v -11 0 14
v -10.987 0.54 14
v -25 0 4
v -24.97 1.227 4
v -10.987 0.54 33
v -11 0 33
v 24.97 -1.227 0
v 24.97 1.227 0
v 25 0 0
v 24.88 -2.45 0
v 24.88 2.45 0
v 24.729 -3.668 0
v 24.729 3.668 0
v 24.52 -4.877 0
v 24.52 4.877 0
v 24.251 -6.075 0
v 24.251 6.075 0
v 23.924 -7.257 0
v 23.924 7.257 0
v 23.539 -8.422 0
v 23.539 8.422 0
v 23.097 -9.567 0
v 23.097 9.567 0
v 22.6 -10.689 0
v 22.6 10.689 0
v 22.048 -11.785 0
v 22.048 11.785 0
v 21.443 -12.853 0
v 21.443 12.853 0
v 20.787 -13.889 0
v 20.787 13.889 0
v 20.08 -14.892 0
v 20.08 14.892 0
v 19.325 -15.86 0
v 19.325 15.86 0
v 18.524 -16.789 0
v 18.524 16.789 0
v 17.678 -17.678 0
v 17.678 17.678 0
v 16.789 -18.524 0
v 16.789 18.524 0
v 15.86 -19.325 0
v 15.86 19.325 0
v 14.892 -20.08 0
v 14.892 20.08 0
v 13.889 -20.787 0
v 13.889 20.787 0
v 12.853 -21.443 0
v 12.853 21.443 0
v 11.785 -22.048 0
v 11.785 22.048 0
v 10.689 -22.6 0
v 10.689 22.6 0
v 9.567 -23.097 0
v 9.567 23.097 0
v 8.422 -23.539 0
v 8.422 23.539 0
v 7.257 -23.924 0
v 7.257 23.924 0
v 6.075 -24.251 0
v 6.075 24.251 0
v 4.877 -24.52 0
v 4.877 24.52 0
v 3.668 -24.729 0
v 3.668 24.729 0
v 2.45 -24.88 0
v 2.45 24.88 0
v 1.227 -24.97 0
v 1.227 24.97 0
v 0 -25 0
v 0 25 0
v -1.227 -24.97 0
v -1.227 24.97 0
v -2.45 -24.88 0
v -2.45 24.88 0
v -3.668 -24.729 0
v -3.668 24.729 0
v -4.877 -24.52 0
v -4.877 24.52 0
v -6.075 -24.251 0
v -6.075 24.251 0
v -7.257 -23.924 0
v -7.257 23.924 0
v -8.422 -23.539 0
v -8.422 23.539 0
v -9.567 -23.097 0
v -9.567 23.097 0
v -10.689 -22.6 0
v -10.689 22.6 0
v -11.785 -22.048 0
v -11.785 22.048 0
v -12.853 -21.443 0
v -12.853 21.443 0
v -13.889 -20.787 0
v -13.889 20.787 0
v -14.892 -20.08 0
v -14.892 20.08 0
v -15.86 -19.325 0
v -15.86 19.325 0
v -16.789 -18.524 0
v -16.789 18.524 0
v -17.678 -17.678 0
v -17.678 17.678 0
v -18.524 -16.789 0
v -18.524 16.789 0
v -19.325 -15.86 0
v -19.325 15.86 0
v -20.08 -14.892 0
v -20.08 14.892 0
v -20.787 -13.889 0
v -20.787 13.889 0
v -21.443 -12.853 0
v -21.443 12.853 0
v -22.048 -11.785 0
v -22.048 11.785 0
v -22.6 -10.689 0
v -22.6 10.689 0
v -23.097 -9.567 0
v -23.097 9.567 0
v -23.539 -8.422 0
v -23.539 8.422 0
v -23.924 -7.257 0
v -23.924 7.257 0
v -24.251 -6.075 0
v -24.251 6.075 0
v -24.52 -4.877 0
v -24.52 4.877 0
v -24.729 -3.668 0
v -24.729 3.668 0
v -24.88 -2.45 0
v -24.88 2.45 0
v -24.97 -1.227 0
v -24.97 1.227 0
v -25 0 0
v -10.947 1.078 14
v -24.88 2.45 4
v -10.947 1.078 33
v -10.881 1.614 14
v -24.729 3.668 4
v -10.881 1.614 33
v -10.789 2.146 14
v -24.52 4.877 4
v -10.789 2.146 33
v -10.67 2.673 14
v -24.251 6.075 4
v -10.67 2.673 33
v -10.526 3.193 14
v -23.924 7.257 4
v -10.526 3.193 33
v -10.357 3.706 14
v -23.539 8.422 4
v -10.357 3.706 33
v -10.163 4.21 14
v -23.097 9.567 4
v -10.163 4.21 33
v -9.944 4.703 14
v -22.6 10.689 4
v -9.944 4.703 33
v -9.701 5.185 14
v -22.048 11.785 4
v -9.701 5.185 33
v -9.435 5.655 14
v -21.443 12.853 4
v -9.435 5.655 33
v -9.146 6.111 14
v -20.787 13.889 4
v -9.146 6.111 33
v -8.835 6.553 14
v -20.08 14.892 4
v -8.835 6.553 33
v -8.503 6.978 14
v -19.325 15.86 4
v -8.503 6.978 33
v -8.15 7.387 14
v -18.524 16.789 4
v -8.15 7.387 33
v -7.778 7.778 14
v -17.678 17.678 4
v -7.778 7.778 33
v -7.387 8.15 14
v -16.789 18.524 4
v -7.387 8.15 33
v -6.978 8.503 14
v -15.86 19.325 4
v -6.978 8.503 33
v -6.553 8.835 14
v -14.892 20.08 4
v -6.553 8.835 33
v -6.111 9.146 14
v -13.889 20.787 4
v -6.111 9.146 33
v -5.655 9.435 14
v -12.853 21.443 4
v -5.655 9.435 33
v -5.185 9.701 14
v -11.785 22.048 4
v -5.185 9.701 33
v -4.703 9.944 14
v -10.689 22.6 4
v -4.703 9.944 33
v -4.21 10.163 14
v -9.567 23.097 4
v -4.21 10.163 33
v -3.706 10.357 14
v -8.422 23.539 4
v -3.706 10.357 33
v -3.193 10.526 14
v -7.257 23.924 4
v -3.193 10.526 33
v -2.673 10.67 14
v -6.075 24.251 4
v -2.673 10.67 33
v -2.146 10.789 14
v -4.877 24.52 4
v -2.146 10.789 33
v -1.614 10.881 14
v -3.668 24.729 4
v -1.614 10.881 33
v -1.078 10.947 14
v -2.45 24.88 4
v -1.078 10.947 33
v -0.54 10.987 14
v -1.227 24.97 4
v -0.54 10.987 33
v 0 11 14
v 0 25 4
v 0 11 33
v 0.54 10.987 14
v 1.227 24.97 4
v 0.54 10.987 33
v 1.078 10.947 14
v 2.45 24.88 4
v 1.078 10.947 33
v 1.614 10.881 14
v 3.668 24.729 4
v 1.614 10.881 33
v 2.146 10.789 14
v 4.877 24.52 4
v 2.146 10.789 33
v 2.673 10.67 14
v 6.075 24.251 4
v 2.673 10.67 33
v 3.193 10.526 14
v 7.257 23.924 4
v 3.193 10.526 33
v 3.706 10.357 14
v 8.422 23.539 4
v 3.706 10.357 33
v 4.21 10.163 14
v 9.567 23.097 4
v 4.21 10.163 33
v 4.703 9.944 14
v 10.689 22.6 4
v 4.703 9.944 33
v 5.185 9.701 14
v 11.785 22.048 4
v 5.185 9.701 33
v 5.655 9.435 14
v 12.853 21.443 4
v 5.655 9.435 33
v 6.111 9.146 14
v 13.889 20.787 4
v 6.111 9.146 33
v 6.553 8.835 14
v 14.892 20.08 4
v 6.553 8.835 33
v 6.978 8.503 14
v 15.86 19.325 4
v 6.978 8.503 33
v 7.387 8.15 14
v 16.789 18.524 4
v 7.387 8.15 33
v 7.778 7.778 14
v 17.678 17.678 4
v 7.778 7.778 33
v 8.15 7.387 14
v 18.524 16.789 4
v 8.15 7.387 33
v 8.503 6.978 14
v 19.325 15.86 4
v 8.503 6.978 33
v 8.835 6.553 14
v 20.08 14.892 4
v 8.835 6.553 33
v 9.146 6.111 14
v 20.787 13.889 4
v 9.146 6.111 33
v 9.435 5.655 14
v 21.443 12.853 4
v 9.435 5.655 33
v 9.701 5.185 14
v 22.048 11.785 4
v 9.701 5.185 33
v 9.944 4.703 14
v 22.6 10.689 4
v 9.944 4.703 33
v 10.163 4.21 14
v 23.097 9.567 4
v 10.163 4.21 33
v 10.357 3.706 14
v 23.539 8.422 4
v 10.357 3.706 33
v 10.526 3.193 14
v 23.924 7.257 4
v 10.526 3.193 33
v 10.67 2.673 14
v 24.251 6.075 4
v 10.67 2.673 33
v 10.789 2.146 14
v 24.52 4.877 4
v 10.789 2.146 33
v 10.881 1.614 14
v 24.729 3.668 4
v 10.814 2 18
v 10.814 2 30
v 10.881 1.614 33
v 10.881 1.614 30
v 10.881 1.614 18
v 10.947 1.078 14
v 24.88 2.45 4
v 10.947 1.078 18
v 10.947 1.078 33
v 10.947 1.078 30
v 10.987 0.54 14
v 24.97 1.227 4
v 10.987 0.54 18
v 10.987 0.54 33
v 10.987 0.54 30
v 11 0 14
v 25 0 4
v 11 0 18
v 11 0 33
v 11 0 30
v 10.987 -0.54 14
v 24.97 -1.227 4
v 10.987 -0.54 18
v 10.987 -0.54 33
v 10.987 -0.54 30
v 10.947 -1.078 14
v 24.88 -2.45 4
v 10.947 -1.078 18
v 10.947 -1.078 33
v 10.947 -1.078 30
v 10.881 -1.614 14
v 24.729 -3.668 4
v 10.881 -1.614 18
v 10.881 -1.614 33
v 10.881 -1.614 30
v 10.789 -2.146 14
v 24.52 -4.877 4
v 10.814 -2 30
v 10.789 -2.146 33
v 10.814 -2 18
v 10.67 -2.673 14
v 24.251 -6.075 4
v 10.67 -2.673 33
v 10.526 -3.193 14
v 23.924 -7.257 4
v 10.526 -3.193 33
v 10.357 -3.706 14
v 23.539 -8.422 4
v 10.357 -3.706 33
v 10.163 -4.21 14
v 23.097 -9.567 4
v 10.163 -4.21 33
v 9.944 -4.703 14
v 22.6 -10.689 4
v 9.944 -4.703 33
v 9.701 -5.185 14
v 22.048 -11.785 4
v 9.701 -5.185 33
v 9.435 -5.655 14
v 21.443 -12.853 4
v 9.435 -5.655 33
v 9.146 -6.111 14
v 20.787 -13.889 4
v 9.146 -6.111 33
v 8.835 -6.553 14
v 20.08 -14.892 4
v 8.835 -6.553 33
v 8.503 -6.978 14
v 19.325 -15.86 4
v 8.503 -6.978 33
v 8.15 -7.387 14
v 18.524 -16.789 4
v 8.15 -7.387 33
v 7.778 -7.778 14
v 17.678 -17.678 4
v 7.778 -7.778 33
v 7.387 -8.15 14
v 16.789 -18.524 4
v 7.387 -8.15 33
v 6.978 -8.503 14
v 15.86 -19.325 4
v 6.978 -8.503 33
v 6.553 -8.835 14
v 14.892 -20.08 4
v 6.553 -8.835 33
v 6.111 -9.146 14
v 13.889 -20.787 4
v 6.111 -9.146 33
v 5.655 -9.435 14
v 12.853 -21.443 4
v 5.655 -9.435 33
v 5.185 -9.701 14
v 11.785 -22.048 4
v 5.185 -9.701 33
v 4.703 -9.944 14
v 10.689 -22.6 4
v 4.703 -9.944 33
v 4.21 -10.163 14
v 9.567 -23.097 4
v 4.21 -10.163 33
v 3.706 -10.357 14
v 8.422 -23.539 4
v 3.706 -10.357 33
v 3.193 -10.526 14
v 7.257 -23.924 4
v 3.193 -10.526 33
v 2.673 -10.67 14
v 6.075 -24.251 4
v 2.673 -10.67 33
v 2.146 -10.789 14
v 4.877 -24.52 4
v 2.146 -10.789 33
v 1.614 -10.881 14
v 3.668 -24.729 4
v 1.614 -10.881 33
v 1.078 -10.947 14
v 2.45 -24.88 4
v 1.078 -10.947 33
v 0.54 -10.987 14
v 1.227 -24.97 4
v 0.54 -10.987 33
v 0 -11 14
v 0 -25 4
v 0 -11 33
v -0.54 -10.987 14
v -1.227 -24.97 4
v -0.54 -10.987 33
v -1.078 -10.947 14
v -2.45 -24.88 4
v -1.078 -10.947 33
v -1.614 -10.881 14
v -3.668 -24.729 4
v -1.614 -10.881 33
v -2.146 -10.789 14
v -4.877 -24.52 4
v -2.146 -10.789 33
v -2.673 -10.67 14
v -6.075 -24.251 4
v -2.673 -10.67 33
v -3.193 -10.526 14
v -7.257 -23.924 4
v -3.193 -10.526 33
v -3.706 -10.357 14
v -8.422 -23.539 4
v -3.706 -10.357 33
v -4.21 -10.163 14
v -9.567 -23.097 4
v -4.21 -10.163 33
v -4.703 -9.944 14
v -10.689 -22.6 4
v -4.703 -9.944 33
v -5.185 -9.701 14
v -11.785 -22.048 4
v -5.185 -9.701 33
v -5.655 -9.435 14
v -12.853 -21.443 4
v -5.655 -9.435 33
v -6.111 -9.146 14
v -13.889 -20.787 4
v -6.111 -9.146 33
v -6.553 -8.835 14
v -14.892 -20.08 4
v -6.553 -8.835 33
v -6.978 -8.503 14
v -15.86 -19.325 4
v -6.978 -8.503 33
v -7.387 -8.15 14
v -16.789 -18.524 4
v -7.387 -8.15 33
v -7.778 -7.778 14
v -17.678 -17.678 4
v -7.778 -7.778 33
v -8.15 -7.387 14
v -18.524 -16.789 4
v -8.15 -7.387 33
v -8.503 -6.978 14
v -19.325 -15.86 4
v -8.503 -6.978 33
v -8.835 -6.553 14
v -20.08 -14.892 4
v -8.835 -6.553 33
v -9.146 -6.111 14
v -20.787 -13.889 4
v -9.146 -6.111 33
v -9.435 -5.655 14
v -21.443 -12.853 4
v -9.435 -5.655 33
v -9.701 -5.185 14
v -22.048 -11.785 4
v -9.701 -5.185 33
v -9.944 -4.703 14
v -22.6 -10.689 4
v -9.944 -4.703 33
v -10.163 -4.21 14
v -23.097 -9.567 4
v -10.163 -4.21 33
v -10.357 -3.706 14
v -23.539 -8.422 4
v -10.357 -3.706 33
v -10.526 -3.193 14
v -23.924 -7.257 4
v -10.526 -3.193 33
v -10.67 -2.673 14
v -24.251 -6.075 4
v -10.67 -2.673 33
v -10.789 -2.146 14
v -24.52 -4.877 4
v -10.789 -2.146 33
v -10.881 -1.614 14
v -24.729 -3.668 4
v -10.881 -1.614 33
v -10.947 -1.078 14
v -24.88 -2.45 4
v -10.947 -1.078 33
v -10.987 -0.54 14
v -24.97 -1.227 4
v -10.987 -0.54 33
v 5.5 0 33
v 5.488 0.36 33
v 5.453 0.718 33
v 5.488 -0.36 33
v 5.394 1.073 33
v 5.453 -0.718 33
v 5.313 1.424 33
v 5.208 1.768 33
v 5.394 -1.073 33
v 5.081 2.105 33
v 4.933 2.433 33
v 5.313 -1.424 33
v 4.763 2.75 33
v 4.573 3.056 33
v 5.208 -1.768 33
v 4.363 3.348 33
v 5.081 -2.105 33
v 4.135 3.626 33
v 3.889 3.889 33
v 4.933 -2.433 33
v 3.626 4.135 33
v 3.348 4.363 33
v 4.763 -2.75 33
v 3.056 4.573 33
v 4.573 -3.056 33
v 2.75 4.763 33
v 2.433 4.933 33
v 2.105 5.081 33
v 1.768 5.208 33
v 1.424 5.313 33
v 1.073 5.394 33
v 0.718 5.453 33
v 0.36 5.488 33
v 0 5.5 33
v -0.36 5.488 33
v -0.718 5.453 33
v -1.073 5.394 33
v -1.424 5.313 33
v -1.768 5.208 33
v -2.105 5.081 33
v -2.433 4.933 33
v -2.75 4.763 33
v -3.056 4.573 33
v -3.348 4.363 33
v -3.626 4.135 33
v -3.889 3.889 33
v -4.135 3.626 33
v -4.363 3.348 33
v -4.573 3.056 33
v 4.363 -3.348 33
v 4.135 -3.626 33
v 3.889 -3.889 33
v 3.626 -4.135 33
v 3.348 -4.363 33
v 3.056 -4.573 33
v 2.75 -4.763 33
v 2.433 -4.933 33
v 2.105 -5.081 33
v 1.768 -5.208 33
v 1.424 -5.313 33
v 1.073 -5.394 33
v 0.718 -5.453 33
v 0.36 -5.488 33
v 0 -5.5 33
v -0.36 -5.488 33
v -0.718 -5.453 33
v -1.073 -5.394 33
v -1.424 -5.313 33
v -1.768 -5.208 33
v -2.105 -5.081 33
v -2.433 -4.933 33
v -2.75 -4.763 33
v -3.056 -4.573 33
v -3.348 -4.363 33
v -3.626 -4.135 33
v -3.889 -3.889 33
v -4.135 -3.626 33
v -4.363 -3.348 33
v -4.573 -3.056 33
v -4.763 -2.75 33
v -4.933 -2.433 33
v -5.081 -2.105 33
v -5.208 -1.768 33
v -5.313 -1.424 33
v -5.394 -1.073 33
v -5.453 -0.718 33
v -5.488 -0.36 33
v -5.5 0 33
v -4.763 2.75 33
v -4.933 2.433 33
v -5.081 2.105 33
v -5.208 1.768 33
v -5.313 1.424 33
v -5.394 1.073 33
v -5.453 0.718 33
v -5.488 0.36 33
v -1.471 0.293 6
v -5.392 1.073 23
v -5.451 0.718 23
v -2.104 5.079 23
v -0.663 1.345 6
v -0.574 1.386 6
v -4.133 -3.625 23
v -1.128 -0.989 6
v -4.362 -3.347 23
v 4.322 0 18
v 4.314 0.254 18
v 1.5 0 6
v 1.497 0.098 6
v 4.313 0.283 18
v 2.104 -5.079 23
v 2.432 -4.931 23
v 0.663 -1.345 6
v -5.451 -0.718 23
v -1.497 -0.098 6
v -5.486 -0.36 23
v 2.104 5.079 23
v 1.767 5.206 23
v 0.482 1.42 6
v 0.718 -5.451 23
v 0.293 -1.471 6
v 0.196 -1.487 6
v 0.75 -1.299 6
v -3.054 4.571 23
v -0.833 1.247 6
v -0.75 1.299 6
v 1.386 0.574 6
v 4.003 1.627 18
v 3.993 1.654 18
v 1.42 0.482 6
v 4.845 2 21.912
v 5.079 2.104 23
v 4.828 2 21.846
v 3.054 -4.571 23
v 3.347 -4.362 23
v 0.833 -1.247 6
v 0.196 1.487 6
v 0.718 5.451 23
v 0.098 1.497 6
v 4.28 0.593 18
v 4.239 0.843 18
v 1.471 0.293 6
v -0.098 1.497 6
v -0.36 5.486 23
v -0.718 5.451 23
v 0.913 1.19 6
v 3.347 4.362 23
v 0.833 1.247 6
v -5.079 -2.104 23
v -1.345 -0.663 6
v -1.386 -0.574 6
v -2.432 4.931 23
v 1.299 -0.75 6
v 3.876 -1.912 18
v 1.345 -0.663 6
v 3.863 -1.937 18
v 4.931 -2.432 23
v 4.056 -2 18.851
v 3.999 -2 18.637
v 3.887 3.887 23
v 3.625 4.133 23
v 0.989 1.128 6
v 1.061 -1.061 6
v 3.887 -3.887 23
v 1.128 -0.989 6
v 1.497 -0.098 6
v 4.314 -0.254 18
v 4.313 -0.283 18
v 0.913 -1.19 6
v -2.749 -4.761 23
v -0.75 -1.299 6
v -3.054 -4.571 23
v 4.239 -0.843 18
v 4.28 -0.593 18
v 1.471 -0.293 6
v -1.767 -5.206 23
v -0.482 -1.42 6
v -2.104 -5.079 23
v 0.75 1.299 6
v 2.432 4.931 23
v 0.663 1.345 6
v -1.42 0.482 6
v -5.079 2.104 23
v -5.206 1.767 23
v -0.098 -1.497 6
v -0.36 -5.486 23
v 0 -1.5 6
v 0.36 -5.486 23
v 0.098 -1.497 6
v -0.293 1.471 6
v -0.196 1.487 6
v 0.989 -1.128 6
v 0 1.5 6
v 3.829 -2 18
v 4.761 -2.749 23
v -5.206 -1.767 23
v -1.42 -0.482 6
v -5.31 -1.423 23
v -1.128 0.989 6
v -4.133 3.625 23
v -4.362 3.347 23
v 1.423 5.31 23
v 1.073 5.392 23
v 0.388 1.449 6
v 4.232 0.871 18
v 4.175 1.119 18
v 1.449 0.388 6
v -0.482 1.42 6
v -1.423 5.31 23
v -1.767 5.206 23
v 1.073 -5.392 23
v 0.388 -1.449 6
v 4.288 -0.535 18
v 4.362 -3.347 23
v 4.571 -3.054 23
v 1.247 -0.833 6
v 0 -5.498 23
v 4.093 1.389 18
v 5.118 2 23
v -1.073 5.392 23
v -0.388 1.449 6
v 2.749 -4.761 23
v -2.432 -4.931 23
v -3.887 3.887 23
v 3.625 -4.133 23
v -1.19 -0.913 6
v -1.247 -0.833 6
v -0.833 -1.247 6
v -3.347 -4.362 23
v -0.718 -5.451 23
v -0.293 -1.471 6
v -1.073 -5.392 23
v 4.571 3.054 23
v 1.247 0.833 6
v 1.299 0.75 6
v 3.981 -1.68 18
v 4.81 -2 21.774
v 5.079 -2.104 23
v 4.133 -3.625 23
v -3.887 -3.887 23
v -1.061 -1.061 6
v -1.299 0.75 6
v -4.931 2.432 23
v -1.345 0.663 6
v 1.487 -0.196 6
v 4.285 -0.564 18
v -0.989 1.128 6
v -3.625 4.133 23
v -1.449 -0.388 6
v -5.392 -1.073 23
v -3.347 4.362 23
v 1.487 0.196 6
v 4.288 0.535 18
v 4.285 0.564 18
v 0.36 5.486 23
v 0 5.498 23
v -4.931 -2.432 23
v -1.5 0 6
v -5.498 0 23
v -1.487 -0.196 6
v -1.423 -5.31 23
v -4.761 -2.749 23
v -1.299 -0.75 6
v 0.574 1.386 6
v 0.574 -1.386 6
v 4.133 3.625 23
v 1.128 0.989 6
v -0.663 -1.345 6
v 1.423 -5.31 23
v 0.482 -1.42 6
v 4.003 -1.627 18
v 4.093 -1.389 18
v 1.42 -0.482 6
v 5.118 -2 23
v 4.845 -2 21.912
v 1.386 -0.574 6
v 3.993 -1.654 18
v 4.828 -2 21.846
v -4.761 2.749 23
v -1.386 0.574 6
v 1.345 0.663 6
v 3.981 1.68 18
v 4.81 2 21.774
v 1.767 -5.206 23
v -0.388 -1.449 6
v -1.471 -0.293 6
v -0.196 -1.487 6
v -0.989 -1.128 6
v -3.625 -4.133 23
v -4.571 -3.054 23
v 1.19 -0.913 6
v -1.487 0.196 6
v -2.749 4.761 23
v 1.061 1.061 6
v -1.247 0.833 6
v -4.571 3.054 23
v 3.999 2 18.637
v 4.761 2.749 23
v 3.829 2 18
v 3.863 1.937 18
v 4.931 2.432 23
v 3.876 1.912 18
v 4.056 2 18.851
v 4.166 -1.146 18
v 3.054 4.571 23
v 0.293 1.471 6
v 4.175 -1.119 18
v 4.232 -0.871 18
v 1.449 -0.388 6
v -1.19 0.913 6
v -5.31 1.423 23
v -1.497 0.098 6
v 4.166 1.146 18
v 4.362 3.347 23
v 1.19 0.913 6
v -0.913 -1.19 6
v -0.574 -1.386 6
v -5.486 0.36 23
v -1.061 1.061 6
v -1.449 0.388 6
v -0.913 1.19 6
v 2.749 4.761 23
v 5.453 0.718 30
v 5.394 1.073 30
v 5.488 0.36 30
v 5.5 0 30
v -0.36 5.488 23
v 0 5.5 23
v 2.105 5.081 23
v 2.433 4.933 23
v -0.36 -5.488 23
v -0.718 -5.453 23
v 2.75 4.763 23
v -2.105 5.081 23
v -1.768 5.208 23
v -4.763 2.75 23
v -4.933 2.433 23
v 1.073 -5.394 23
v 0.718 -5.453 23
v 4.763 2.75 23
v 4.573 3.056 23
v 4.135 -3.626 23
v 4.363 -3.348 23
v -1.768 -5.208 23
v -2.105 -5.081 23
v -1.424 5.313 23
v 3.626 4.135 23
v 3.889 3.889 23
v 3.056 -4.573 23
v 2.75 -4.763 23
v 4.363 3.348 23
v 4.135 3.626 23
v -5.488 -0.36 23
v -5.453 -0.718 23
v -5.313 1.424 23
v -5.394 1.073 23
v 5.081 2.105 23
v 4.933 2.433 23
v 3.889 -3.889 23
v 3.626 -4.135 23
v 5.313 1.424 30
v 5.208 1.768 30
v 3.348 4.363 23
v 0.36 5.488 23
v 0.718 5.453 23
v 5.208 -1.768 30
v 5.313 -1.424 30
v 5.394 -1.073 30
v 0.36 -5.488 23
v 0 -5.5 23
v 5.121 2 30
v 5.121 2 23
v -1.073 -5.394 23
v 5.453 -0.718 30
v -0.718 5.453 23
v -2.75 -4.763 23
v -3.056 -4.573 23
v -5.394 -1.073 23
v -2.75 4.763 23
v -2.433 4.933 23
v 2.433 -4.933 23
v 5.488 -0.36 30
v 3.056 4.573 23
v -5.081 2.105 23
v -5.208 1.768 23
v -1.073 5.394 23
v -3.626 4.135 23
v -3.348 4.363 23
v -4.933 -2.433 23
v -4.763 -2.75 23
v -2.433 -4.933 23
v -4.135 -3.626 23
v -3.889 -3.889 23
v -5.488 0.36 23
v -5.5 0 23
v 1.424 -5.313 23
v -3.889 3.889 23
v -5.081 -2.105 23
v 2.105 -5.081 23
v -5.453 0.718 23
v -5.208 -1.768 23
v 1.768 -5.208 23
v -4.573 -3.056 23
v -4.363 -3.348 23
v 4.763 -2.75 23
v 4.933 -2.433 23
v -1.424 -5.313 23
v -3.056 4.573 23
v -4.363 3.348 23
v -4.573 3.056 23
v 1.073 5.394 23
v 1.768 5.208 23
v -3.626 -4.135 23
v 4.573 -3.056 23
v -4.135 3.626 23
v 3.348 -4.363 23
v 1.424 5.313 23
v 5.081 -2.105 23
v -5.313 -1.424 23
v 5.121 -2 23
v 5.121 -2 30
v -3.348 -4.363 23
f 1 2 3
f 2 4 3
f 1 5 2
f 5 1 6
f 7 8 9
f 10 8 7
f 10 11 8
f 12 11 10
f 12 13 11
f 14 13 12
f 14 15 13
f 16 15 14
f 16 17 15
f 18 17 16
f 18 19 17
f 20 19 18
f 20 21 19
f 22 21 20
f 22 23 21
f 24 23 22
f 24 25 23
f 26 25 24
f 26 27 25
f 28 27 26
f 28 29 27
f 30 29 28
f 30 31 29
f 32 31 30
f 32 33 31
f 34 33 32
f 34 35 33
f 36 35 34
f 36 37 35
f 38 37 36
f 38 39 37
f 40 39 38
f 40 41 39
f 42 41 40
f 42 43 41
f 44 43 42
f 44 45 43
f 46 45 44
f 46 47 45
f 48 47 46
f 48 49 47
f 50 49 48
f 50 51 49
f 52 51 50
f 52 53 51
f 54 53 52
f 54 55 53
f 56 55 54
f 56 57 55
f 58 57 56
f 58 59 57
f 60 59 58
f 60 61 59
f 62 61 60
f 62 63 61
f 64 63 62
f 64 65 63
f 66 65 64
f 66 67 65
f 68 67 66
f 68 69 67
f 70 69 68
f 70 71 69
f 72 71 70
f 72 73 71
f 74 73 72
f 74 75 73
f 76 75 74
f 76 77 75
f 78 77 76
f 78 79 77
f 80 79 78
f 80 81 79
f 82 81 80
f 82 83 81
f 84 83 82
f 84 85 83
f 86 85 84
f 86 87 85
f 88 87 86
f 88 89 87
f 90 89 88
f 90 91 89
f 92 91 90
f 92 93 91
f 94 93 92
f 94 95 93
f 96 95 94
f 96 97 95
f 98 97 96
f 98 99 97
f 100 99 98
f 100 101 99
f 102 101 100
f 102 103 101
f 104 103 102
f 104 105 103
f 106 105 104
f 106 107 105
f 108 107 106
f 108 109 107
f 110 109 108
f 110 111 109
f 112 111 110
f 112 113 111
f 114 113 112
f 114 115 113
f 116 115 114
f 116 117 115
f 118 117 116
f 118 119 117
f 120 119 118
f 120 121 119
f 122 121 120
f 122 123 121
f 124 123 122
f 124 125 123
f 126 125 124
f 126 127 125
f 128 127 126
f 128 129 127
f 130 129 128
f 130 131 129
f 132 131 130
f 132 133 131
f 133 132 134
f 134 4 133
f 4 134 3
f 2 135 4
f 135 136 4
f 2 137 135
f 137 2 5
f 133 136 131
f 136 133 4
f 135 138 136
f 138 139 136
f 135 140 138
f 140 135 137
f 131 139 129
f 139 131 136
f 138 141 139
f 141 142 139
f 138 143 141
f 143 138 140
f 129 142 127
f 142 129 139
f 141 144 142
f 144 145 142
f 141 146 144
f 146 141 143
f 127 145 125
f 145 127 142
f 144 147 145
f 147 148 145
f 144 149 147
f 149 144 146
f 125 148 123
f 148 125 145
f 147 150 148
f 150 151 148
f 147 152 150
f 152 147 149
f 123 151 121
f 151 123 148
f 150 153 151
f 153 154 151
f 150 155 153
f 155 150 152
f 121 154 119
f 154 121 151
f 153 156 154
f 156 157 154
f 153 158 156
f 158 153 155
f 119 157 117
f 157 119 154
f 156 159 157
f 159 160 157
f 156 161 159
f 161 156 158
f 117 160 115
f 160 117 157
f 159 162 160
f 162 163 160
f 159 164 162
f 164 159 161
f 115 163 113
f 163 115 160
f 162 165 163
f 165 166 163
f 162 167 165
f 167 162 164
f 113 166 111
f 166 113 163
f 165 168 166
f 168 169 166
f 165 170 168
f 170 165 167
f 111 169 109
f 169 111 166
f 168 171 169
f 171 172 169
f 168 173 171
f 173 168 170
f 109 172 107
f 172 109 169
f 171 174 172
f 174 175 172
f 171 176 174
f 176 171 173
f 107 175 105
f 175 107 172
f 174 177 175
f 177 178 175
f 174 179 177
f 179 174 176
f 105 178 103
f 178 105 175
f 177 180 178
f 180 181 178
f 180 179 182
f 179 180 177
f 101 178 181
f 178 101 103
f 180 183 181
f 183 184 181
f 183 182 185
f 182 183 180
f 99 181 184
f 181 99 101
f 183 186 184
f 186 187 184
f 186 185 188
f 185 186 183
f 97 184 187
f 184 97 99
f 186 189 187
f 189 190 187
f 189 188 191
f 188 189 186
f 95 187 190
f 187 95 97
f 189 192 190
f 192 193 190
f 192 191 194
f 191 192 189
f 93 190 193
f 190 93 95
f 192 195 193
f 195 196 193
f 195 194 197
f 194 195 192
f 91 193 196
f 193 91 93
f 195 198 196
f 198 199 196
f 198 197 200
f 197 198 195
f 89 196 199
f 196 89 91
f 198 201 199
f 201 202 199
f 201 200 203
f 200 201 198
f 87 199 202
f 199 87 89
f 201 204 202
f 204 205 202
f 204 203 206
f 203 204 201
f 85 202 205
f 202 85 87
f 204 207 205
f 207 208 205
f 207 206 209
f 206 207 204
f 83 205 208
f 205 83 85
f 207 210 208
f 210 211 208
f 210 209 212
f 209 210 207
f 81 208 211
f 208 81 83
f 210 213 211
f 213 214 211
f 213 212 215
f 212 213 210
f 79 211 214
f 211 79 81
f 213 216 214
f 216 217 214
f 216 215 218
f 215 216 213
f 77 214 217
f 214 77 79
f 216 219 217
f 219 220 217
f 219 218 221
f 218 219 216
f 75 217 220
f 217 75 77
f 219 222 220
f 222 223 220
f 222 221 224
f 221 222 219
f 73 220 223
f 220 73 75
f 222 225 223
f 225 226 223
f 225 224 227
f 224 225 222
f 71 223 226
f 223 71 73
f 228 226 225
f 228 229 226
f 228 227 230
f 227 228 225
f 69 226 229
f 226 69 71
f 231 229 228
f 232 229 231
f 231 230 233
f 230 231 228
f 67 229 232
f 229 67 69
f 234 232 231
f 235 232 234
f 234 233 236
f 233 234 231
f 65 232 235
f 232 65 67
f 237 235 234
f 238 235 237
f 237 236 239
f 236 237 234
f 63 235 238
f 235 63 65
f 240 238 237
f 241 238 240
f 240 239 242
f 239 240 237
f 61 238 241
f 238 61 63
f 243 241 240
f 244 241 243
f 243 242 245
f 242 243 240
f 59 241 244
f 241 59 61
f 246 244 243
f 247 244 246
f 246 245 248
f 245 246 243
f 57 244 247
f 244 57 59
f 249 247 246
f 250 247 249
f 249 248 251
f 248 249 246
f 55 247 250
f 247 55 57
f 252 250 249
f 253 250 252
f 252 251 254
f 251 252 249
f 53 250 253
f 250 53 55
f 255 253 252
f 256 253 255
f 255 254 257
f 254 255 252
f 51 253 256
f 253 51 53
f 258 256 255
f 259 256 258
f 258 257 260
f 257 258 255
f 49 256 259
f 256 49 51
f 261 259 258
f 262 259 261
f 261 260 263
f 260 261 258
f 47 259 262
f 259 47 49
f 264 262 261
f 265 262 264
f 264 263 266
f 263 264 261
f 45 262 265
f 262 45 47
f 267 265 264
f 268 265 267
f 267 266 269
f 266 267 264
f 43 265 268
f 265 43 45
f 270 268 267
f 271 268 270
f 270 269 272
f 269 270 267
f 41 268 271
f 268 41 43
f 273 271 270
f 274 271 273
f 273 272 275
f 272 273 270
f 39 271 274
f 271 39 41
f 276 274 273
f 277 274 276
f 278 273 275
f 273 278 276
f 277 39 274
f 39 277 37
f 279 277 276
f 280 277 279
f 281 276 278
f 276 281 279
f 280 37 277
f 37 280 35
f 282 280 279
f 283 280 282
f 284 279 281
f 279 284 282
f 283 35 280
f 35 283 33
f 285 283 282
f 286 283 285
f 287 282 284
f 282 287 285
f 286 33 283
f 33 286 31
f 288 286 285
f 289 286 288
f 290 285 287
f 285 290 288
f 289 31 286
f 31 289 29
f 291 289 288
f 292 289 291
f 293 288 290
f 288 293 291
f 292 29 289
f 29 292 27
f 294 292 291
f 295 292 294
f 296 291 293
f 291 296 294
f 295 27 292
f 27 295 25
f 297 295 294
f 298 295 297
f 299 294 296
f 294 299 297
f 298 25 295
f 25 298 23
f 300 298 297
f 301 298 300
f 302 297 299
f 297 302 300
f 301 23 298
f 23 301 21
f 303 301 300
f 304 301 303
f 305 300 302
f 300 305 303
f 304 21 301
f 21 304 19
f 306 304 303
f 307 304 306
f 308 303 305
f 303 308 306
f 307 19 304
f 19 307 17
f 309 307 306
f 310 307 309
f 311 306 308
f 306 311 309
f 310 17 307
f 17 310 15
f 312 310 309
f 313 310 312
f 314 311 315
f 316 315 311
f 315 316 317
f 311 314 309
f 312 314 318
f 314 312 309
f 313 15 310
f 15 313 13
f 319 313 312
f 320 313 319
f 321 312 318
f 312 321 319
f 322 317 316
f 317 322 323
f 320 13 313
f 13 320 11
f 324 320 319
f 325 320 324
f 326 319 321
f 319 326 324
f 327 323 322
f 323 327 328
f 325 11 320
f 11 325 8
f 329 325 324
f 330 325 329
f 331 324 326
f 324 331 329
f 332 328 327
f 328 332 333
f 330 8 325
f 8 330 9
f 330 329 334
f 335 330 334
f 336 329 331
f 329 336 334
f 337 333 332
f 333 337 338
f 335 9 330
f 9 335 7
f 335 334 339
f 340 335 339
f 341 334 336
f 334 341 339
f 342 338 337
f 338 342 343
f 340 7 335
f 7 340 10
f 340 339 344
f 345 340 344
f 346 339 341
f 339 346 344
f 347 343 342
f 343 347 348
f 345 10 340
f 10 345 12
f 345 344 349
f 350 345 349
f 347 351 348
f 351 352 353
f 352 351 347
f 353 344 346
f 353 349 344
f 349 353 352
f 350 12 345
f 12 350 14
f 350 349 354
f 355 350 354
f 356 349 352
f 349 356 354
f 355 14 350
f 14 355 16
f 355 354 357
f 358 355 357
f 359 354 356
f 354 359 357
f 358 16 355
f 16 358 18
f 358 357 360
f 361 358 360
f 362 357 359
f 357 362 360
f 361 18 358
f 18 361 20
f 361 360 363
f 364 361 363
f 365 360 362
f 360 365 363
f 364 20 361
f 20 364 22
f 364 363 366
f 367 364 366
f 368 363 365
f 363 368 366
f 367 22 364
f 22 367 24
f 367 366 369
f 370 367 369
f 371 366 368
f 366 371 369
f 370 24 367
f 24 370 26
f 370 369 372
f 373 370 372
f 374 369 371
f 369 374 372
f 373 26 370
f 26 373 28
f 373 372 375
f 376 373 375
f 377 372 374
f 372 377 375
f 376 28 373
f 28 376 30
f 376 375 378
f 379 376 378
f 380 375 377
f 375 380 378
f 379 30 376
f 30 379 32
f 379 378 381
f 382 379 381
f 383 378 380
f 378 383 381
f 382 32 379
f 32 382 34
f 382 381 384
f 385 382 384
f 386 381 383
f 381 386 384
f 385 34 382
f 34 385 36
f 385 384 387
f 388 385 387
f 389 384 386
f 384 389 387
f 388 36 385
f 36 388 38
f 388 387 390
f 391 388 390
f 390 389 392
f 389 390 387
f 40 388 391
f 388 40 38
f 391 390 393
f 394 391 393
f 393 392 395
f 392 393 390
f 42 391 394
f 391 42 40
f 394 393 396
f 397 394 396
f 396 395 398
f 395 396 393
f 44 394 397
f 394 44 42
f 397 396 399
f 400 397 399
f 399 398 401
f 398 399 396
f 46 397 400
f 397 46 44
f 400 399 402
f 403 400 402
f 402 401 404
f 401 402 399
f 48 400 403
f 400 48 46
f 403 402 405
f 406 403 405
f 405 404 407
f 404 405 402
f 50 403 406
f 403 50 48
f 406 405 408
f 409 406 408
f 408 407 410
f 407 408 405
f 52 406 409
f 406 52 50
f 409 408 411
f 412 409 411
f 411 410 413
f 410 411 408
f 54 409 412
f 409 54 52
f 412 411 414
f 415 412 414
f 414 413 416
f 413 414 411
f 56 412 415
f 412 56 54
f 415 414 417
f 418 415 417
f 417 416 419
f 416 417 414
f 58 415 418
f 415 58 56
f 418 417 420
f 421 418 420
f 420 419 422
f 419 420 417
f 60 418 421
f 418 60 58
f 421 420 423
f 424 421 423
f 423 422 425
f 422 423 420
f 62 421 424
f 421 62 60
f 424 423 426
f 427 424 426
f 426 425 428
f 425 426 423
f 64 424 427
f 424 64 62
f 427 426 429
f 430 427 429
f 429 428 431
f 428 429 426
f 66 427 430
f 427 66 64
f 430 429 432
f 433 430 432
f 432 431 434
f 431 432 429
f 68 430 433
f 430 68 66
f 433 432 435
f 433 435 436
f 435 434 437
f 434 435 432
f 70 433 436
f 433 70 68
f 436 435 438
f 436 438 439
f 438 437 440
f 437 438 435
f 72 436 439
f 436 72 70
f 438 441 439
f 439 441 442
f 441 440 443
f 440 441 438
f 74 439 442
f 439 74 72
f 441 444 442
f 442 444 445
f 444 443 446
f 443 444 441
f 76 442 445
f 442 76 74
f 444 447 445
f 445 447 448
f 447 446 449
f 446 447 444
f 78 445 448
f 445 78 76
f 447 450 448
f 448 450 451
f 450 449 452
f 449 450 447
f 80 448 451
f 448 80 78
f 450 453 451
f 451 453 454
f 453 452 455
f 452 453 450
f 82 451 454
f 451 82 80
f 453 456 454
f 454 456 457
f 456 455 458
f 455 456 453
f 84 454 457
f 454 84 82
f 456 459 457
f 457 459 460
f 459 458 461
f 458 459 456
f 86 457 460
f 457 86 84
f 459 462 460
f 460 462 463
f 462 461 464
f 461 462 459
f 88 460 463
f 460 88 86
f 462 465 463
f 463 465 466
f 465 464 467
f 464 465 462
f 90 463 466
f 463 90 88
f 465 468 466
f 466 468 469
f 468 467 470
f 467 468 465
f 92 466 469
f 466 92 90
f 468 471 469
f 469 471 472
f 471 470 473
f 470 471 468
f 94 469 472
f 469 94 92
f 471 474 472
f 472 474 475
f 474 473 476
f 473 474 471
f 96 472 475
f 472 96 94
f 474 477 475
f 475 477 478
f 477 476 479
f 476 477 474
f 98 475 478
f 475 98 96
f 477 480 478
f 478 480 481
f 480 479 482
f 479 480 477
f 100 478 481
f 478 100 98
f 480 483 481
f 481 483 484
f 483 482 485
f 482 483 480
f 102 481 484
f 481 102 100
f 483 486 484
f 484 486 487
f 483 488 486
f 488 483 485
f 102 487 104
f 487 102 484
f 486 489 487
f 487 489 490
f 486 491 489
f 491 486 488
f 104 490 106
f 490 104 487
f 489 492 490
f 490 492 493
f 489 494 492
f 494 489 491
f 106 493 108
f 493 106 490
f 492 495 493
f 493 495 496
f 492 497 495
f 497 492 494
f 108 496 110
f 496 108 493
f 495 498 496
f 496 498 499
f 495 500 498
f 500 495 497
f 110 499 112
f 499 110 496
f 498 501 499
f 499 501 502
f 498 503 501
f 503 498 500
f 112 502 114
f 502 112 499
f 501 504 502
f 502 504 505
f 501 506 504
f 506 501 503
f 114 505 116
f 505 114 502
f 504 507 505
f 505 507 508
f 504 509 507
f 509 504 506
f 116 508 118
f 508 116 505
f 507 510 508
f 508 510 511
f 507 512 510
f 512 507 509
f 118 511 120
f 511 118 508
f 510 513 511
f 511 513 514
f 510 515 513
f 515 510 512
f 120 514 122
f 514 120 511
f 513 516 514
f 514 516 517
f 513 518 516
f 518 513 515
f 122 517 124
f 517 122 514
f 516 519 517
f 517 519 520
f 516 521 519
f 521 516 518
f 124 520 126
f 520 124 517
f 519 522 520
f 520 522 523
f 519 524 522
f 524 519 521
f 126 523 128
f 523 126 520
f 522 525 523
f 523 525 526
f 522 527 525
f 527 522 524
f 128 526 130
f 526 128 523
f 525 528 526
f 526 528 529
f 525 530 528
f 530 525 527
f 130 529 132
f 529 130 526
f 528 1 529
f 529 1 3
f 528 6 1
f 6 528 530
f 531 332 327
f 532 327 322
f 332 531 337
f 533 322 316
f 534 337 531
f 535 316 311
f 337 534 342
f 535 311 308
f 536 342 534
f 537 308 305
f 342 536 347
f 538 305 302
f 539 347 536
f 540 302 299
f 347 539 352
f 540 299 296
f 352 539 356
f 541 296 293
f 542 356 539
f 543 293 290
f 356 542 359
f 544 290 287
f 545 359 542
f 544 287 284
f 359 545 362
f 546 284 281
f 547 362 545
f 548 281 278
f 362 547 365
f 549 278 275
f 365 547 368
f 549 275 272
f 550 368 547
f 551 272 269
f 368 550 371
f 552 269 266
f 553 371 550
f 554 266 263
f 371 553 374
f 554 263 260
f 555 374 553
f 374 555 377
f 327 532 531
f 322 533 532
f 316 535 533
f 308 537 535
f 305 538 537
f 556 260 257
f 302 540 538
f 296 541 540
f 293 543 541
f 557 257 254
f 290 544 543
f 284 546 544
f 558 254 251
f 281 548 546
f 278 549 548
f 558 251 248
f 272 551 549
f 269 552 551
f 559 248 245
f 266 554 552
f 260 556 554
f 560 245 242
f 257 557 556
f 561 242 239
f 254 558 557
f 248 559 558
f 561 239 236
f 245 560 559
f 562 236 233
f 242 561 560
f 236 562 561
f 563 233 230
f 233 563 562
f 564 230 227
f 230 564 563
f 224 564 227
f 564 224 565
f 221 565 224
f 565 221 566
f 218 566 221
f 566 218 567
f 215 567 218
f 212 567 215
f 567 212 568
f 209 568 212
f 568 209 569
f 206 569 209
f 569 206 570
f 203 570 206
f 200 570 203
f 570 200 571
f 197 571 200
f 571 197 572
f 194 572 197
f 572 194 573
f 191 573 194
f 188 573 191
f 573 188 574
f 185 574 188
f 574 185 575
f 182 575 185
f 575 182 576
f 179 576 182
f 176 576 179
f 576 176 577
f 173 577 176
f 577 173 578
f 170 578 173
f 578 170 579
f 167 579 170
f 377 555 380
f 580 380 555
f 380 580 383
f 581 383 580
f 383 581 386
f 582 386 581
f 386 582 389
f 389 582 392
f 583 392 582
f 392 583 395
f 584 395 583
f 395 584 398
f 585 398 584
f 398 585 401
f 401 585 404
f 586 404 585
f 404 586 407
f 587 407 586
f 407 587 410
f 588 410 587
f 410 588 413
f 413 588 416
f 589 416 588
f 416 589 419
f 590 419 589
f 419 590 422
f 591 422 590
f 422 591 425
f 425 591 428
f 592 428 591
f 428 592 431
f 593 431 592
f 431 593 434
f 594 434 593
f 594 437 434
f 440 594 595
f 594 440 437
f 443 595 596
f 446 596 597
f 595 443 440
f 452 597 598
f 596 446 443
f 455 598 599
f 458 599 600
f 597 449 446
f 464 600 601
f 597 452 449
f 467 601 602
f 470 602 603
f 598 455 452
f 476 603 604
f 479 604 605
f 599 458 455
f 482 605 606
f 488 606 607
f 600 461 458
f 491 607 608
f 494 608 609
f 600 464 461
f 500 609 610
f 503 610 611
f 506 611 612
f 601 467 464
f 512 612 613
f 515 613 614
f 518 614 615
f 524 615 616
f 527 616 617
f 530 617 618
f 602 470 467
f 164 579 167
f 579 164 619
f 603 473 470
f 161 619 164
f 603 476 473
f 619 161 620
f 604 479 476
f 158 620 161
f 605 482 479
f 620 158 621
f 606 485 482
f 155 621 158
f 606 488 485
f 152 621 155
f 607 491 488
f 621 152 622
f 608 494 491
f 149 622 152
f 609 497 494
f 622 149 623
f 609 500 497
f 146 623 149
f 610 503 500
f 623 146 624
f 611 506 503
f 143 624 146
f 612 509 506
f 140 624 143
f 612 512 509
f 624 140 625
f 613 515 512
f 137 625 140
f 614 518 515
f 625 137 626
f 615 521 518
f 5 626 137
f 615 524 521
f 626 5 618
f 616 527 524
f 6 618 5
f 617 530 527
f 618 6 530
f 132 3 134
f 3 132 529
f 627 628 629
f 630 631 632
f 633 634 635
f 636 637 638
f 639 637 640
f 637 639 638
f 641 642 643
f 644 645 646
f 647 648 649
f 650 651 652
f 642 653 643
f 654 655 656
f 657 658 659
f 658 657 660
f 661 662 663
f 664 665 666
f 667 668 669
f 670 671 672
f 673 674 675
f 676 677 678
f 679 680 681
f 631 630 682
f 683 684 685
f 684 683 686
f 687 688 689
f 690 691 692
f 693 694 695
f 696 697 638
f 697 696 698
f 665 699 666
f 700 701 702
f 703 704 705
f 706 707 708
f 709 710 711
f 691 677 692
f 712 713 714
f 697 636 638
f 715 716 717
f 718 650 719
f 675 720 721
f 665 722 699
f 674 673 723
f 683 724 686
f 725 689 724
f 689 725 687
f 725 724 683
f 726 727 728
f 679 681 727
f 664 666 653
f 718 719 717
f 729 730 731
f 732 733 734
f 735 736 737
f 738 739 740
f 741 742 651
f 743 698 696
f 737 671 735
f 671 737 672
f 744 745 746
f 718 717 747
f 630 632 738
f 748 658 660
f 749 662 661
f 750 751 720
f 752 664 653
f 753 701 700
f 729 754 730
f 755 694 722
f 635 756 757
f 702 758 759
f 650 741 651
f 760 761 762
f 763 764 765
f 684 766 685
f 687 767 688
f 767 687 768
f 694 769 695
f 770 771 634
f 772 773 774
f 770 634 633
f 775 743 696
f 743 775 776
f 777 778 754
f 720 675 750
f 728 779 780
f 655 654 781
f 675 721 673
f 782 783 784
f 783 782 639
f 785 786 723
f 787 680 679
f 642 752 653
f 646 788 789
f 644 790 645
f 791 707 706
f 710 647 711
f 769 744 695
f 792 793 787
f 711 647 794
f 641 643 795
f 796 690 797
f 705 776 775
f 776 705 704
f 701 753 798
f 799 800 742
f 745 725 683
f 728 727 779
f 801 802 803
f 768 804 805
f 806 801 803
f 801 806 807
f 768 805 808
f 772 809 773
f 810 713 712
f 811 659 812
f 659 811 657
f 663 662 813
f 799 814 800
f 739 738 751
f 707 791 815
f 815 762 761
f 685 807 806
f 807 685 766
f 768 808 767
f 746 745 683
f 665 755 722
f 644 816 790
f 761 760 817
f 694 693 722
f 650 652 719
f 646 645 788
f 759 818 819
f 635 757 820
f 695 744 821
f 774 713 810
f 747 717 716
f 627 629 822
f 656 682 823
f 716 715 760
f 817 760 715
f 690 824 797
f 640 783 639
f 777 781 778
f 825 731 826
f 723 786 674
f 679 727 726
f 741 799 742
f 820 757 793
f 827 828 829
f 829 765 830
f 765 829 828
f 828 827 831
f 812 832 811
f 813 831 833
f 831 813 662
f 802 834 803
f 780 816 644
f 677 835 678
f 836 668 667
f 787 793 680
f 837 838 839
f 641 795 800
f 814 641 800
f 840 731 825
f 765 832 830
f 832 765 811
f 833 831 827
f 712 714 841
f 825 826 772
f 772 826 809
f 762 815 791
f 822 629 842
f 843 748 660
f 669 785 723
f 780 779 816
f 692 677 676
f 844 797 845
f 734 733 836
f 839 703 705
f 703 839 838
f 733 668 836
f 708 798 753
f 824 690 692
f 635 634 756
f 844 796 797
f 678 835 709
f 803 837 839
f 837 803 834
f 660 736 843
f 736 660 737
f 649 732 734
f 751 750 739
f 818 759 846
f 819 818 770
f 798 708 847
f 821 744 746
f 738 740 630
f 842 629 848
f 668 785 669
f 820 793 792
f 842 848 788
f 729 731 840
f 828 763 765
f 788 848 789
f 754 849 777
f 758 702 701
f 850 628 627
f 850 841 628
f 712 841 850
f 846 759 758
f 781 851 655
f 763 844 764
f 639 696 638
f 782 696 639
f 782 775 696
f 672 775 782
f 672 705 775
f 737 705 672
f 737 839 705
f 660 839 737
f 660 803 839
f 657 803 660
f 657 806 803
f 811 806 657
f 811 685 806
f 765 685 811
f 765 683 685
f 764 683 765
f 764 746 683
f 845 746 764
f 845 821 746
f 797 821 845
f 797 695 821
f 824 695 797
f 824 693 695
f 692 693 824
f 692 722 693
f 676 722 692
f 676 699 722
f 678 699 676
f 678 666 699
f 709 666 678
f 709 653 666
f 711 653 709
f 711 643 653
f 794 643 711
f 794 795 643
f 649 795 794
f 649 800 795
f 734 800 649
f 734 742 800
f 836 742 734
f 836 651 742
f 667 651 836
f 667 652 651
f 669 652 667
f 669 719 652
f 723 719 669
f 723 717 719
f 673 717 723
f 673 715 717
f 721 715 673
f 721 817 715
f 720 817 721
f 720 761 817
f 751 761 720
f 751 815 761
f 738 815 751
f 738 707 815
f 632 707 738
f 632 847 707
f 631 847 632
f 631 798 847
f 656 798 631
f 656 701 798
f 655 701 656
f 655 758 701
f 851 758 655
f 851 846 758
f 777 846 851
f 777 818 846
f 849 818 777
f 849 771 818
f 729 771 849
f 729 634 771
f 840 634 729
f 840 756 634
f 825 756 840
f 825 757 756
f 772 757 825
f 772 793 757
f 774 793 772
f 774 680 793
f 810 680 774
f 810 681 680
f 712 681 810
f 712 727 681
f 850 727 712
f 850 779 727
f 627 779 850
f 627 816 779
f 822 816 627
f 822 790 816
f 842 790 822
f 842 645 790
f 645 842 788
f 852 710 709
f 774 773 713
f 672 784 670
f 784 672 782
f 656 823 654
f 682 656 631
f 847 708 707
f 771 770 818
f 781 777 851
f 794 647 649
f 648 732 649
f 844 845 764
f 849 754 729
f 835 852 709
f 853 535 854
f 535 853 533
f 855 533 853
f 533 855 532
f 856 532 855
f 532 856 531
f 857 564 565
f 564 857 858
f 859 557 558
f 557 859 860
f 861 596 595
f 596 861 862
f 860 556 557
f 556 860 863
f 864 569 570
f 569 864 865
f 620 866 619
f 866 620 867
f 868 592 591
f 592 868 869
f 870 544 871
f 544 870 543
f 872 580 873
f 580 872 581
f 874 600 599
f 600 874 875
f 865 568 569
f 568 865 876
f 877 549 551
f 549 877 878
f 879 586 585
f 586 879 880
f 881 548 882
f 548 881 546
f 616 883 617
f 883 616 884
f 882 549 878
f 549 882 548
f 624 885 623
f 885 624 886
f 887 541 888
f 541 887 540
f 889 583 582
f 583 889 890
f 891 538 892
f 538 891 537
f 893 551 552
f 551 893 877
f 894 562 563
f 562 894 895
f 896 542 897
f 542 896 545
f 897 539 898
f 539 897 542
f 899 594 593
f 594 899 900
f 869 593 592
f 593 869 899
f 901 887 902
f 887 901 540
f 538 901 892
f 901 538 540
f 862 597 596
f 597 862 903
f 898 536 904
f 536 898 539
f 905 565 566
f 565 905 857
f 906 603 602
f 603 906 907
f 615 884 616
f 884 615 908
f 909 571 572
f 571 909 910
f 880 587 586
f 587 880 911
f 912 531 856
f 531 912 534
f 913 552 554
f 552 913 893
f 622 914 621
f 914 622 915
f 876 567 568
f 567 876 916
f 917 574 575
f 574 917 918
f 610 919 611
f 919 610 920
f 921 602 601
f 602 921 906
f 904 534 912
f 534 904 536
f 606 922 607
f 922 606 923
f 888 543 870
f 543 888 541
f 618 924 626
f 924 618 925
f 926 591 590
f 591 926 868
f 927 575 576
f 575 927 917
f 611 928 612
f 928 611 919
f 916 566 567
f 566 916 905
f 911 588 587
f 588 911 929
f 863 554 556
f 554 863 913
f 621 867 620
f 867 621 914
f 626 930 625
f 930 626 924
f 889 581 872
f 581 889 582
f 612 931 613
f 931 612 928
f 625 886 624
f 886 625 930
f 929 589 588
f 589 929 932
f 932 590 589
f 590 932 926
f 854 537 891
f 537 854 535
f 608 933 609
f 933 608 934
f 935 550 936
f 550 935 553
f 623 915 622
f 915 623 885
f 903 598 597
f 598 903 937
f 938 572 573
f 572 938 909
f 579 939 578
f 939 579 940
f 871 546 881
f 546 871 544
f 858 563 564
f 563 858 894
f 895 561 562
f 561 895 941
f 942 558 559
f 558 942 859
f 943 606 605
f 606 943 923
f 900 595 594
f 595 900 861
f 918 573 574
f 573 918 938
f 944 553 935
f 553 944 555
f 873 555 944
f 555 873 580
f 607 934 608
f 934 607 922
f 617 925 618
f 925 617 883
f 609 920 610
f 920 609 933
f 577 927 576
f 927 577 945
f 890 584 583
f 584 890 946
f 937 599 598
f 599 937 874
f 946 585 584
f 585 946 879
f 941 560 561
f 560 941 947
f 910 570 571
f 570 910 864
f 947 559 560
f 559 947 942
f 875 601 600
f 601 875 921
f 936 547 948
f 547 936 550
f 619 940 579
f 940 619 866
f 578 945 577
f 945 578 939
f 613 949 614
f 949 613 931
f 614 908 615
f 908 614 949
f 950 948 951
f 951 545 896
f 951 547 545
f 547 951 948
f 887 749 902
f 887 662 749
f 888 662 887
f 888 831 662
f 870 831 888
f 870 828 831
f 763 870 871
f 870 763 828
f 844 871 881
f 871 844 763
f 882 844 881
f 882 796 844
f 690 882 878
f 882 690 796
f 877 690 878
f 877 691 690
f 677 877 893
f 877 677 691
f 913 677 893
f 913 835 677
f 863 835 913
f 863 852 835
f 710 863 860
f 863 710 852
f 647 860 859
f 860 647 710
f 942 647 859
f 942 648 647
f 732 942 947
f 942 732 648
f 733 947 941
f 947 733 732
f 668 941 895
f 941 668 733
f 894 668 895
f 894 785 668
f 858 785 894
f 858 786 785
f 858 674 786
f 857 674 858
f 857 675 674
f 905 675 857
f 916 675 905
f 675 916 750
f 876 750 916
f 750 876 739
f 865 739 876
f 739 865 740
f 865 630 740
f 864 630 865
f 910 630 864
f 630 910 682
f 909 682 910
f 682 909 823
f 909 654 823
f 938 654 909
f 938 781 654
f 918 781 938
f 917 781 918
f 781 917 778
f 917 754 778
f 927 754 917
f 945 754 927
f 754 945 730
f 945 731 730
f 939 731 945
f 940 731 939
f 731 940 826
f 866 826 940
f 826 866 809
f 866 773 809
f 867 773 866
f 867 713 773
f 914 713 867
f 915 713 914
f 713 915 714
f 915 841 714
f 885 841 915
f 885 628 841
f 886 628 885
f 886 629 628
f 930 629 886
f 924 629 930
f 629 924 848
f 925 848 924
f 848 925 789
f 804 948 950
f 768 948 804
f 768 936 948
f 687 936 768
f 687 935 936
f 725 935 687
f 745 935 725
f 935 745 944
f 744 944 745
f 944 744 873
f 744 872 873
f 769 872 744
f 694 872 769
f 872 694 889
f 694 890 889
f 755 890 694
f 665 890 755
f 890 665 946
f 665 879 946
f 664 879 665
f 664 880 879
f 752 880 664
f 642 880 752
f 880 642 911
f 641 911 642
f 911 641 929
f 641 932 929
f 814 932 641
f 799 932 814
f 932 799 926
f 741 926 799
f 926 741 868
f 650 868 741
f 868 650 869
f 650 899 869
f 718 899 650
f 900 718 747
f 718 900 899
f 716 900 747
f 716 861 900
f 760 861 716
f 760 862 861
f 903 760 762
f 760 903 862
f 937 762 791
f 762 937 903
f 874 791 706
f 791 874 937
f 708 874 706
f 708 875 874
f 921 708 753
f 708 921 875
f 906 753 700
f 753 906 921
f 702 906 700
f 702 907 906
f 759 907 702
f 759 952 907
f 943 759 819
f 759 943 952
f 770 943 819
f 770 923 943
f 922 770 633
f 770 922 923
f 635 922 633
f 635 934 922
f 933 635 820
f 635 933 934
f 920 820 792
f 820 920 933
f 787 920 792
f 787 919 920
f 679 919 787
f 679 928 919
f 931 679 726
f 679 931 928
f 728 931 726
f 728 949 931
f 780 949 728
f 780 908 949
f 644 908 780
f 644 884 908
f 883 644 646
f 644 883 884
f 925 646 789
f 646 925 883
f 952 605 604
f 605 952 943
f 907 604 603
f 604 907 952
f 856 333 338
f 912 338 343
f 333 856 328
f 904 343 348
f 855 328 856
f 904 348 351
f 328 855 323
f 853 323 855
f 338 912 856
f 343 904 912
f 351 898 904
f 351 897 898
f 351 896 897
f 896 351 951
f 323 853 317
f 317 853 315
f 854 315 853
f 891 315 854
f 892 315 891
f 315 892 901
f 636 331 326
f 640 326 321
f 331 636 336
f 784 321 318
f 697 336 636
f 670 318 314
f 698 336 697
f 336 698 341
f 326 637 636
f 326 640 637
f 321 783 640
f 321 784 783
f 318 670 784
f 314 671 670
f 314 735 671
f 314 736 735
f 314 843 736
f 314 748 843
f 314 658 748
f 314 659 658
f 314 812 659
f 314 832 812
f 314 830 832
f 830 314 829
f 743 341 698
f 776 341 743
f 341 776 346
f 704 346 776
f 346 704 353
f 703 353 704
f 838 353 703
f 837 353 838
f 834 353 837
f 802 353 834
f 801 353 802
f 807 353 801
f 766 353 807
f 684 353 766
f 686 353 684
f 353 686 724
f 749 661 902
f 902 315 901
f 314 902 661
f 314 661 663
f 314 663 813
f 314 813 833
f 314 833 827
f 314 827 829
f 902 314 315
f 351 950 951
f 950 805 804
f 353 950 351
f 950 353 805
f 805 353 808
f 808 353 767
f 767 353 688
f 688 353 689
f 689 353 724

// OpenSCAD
// Weighing stand that holds one 1.5 mL microcentrifuge tube upright on a balance pan
// Category: quick fixes. A revolved stand (base disc, cone, column) with a seat that follows the
// tube's conical tip, and a viewing window through the column wall on the +X side.
// Print: PLA or PETG, standing up, 0.2 mm layers. Tare the balance with the stand on it.
// SPDX-License-Identifier: CERN-OHL-P-2.0

/* [Stand] */
base_d = 50;  base_h = 4;       // disc z = 0 .. 4
col_d = 22;   cone_top = 14;    // cone 50 -> 22 mm from z = 4 to 14
height = 33;                    // column from z = 14 to 33
seat_d = 11;  seat_cyl_z = 23;  // 11 mm from the top down to z = 23 ...
tip_d = 3;    tip_z = 6;        // ... then a cone narrowing to 3 mm at z = 6
win_w = 4;    win_z = [18, 30]; // viewing window through the +X wall

/* [Hidden] */
$fn = 128;
eps = 0.01;

difference() {
    rotate_extrude() polygon([[0, 0], [base_d / 2, 0], [base_d / 2, base_h], [col_d / 2, cone_top],
                              [col_d / 2, height], [0, height]]);
    translate([0, 0, tip_z]) cylinder(d1 = tip_d, d2 = seat_d, h = seat_cyl_z - tip_z + eps, $fn = 96);
    translate([0, 0, seat_cyl_z]) cylinder(d = seat_d, h = height - seat_cyl_z + 1, $fn = 96);
    translate([0, -win_w / 2, win_z[0]]) cube([col_d / 2 + 1, win_w, win_z[1] - win_z[0]]);
}
